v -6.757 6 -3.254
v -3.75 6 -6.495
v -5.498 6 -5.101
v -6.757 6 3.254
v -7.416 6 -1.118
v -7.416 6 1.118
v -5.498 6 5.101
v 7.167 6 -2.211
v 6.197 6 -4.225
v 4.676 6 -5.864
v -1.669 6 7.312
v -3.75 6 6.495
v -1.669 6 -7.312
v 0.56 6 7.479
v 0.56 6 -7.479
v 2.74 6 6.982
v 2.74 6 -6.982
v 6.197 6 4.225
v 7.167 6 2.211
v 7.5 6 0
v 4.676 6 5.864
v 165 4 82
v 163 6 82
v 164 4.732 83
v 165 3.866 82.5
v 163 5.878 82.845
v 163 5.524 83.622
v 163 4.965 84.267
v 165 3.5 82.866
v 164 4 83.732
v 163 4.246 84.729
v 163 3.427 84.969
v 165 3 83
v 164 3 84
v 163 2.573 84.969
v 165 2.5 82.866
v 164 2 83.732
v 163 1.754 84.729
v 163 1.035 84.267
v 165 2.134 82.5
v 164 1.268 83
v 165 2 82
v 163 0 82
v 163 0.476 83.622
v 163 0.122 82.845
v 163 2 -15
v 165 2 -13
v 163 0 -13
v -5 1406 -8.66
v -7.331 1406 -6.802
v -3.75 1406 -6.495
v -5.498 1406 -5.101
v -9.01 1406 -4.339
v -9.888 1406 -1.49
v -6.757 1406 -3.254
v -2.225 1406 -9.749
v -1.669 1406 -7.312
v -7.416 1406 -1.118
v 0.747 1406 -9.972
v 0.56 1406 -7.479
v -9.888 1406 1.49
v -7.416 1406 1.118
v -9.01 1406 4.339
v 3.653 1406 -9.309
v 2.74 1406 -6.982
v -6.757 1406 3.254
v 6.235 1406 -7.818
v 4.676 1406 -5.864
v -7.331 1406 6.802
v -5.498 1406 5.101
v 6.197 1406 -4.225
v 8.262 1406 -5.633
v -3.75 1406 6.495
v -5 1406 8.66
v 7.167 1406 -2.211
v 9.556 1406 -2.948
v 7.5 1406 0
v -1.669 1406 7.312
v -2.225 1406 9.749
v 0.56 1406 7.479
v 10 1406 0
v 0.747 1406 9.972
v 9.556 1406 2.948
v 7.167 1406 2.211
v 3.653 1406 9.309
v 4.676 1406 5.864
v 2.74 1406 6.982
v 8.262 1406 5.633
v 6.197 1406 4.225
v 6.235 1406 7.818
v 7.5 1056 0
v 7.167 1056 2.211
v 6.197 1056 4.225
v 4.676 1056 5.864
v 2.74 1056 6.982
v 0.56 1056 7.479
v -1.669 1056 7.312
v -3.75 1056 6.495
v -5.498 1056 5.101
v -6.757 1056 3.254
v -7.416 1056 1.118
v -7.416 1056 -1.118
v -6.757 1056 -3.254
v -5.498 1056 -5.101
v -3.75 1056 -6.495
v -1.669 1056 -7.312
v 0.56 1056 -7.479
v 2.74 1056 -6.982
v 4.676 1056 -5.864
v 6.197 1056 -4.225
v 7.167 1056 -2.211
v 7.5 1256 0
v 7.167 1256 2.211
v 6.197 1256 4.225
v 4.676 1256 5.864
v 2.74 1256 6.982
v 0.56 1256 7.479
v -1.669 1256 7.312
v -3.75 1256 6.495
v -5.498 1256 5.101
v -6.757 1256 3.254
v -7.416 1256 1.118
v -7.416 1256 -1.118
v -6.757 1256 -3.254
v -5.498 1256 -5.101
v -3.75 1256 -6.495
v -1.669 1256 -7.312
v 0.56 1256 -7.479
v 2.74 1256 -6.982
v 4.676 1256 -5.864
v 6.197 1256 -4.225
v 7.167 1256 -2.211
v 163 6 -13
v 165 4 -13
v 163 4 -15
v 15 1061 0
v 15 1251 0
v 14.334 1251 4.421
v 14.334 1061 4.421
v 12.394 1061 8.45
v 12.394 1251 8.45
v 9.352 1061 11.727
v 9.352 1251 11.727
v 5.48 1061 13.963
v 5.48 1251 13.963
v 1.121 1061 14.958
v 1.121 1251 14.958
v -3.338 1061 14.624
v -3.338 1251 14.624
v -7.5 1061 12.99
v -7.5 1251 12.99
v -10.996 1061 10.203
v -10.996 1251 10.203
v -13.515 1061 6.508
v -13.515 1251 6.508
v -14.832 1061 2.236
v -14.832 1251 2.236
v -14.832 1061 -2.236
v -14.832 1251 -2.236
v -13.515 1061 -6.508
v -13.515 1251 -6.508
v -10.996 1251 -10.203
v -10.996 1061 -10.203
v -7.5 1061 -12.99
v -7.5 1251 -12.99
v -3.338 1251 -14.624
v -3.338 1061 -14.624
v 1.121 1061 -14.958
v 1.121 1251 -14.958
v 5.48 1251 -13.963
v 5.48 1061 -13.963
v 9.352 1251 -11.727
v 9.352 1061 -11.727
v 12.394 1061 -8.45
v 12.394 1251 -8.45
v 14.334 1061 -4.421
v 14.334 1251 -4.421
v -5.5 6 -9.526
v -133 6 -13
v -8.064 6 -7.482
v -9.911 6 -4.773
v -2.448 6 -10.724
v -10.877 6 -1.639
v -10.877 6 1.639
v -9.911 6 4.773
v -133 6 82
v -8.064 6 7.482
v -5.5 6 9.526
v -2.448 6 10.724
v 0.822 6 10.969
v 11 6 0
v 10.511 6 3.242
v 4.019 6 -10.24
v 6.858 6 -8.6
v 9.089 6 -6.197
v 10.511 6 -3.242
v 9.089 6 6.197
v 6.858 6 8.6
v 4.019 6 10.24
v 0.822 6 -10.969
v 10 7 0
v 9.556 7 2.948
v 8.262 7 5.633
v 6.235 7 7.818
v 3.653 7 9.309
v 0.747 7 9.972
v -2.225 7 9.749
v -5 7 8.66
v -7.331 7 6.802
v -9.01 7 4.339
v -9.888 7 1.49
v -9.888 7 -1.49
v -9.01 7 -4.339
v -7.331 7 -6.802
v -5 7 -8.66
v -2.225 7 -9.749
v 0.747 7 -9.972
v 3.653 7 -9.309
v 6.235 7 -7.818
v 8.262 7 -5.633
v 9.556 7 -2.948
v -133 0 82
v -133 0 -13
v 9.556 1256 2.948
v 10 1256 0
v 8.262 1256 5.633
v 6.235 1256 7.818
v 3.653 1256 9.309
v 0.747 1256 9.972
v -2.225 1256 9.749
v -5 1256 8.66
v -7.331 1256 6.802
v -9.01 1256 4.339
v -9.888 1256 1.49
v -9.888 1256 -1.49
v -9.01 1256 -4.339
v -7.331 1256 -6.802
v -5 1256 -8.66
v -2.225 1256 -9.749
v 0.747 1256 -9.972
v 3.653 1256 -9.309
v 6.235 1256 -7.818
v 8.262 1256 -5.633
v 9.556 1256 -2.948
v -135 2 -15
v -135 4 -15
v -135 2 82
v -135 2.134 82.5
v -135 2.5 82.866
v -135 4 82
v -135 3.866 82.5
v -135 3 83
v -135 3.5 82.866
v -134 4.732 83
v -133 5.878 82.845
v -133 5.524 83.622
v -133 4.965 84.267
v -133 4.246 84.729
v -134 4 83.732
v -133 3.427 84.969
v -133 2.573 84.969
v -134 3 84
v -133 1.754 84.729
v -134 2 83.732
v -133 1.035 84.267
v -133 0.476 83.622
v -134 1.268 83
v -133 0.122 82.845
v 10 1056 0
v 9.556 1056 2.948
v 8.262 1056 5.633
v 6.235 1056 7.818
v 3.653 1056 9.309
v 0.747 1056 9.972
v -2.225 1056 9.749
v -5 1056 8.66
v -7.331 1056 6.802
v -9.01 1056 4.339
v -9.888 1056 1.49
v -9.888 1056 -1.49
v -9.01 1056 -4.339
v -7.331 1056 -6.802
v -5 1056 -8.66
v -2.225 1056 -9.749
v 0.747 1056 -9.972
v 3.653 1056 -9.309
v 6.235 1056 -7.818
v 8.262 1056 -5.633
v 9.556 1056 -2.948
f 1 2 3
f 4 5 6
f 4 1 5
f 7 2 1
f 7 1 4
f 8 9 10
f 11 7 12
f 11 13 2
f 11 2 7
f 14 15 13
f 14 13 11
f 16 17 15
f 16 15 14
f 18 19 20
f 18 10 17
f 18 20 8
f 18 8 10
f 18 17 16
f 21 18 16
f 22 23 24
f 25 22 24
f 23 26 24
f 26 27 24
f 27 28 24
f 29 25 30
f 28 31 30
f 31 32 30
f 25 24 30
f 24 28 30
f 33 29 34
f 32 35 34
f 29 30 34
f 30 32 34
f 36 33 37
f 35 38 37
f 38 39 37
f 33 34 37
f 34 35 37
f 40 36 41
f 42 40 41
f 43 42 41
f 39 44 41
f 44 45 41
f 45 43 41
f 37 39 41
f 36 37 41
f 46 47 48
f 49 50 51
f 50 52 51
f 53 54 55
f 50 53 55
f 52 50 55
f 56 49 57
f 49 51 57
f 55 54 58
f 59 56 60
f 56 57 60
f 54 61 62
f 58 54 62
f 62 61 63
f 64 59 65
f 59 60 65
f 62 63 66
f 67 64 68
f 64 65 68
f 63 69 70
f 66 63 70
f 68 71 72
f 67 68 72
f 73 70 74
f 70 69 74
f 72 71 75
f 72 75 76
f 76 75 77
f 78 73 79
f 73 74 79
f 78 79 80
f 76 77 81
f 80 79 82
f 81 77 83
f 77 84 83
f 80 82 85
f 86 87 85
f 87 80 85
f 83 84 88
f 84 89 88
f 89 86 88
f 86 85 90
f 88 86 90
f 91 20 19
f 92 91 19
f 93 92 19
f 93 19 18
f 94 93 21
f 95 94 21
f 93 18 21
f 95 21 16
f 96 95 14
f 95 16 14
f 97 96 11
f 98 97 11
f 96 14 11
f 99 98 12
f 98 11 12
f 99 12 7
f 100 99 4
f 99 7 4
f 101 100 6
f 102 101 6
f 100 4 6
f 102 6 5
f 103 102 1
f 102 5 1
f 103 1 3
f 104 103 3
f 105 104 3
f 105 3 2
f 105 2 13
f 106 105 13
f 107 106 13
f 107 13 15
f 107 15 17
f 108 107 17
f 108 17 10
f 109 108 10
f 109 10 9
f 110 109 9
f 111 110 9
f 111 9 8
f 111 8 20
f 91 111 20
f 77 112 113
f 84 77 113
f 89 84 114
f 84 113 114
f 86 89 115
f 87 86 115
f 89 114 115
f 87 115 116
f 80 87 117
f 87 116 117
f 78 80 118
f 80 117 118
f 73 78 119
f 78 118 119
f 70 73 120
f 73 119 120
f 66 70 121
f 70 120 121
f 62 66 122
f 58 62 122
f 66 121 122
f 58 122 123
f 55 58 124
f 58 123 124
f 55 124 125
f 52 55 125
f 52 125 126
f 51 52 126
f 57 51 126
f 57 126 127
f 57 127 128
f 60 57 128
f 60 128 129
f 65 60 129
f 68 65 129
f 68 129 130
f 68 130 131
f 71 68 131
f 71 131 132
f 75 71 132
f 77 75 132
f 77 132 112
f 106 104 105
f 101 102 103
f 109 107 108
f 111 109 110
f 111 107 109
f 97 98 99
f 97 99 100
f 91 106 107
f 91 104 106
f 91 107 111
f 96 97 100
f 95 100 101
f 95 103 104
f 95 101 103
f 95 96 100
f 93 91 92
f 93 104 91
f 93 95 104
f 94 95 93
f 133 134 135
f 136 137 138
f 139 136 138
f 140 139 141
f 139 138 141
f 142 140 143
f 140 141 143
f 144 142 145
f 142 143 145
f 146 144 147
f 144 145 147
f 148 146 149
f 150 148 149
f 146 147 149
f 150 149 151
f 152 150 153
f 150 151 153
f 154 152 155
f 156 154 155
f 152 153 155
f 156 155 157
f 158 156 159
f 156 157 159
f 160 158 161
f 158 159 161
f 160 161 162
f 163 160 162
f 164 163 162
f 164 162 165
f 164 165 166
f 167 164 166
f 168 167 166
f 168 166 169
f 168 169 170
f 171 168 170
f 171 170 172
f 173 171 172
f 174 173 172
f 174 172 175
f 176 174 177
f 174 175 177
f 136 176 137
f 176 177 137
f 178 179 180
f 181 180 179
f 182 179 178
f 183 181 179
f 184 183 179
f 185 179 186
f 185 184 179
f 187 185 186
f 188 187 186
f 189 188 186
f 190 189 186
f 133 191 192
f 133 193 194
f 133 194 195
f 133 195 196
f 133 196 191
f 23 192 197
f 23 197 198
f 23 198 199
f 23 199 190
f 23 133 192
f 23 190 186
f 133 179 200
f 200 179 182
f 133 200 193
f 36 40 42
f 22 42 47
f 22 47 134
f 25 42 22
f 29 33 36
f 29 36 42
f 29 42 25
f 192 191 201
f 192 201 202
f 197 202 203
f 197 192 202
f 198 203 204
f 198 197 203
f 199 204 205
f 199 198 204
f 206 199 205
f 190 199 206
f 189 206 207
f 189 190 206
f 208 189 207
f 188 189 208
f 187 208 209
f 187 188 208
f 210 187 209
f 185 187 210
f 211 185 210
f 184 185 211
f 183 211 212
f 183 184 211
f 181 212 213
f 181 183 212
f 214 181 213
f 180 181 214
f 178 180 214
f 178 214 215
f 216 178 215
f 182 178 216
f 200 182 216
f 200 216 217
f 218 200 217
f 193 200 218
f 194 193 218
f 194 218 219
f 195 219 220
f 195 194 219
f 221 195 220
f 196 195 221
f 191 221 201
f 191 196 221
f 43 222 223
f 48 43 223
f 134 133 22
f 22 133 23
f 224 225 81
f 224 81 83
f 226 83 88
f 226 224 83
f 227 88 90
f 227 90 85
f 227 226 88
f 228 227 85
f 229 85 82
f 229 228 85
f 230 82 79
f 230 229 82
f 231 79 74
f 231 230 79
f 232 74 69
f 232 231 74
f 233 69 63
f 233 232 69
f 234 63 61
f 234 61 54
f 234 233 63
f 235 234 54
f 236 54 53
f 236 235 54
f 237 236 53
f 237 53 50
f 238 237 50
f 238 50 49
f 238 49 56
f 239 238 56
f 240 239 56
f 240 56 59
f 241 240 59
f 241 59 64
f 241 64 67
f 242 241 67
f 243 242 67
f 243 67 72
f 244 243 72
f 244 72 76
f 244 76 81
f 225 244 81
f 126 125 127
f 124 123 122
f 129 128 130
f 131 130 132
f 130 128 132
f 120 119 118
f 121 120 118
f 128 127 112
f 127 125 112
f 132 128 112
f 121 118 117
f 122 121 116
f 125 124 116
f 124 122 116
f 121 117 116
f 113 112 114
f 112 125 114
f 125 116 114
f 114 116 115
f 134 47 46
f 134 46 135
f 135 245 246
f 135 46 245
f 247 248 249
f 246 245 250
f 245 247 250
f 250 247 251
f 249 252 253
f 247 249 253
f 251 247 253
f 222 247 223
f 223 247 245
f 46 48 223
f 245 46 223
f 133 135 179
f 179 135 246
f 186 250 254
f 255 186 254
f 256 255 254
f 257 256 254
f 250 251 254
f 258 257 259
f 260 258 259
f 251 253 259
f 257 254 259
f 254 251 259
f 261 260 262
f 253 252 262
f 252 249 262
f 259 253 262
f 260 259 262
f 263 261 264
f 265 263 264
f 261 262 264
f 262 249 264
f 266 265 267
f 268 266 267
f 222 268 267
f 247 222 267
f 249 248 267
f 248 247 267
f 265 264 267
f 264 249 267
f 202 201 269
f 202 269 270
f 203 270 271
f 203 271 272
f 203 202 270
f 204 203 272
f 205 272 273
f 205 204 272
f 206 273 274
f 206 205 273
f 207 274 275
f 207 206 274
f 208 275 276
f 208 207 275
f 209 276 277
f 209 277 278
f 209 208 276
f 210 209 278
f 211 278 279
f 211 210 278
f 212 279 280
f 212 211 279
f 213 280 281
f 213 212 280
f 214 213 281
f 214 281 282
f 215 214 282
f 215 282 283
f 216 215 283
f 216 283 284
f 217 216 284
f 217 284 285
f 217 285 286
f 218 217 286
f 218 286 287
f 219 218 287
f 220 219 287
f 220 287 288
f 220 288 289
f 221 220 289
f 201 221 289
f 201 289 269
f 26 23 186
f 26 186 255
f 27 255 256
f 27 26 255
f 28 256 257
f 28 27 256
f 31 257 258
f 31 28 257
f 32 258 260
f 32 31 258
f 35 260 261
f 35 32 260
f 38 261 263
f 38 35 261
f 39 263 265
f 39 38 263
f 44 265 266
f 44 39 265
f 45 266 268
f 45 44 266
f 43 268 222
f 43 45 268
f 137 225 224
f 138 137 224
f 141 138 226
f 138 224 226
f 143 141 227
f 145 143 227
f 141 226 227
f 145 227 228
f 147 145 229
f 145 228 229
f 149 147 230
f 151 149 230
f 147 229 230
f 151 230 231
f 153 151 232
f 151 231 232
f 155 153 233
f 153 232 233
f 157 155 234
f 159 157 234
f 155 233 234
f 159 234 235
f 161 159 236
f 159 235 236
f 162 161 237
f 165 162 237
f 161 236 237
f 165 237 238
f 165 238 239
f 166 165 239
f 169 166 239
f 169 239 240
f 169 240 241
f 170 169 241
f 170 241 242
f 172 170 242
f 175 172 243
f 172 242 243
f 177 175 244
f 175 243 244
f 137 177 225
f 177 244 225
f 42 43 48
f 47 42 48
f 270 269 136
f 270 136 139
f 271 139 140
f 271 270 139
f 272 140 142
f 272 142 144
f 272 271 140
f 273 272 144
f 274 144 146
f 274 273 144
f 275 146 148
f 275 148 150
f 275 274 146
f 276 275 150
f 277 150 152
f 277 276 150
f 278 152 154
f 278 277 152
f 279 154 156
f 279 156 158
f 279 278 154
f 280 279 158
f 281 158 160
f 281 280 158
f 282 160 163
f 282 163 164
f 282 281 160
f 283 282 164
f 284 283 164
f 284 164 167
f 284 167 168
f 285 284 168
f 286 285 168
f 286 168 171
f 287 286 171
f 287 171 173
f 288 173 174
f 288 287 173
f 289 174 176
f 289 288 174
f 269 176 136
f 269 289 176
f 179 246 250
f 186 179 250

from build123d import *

# Parameters (mm, degrees)
F0_R     = 10
F1_DEPTH = 1406
F2_R     = 7.5
F3_DEPTH = 1800
F6_DEPTH = 300
F8_R     = 15
F9_DEPTH = 200
F10_SIZE = 4.99999
F11_SIZE = 1
F12_SIZE = 2


# Not quite as in the source:
# - a fillet or chamfer is up to 0.001 mm smaller than in the source, because OpenCascade refuses the exact size
# - a feature names something its author has since deleted; it is built from what else it names


with BuildPart() as f1:
    # F0 (on Front) → F1 (new body)
    with BuildSketch(Plane.XZ):
        Circle(F0_R)
    extrude(amount=-F1_DEPTH)

    # F2 (on Front) → F3 (cut)
    with BuildSketch(Plane.XZ):
        Circle(F2_R)
    extrude(amount=-F3_DEPTH, mode=Mode.SUBTRACT)

    # F5 (on offset) → F6 (join)
    with BuildSketch(Plane.YZ.offset(165)):
        with BuildLine():
            Line((0, 82), (0, -15))
            Line((0, -15), (6, -15))
            Line((6, -15), (6, 82))
            ThreePointArc((6, 82), (3, 85), (0, 82))
        make_face()
    extrude(amount=-F6_DEPTH)

    # F8 (on offset) → F9 (join)
    with BuildSketch(Plane.XZ.offset(-1256)):
        Circle(F8_R)
    extrude(amount=F9_DEPTH)

    # F10 (size 5 in the source; OpenCascade refuses exactly that, so slightly less here)
    f10_edges = [f1.edges().sort_by_distance(p)[0] for p in [
        (15, 1156, 0),
        (-15, 1256, 0),
        (-15, 1056, 0),
    ]]
    chamfer(f10_edges, length=F10_SIZE)

    # F11
    f11_edges = [f1.edges().sort_by_distance(p)[0] for p in [
        (-10, 6, 0),
    ]]
    chamfer(f11_edges, length=F11_SIZE)

    # F12
    f12_edges = [f1.edges().sort_by_distance(p)[0] for p in [
        (165, 0, 33.5),
        (165, 3, -15),
        (165, 6, 33.5),
        (165, 3, 85),
        (15, 0, -15),
        (15, 6, -15),
        (15, 6, 82),
        (-135, 6, 33.5),
        (-135, 0, 33.5),
        (15, 0, 82),
        (-135, 3, 85),
    ]]
    chamfer(f12_edges, length=F12_SIZE)


solid = f1.part
